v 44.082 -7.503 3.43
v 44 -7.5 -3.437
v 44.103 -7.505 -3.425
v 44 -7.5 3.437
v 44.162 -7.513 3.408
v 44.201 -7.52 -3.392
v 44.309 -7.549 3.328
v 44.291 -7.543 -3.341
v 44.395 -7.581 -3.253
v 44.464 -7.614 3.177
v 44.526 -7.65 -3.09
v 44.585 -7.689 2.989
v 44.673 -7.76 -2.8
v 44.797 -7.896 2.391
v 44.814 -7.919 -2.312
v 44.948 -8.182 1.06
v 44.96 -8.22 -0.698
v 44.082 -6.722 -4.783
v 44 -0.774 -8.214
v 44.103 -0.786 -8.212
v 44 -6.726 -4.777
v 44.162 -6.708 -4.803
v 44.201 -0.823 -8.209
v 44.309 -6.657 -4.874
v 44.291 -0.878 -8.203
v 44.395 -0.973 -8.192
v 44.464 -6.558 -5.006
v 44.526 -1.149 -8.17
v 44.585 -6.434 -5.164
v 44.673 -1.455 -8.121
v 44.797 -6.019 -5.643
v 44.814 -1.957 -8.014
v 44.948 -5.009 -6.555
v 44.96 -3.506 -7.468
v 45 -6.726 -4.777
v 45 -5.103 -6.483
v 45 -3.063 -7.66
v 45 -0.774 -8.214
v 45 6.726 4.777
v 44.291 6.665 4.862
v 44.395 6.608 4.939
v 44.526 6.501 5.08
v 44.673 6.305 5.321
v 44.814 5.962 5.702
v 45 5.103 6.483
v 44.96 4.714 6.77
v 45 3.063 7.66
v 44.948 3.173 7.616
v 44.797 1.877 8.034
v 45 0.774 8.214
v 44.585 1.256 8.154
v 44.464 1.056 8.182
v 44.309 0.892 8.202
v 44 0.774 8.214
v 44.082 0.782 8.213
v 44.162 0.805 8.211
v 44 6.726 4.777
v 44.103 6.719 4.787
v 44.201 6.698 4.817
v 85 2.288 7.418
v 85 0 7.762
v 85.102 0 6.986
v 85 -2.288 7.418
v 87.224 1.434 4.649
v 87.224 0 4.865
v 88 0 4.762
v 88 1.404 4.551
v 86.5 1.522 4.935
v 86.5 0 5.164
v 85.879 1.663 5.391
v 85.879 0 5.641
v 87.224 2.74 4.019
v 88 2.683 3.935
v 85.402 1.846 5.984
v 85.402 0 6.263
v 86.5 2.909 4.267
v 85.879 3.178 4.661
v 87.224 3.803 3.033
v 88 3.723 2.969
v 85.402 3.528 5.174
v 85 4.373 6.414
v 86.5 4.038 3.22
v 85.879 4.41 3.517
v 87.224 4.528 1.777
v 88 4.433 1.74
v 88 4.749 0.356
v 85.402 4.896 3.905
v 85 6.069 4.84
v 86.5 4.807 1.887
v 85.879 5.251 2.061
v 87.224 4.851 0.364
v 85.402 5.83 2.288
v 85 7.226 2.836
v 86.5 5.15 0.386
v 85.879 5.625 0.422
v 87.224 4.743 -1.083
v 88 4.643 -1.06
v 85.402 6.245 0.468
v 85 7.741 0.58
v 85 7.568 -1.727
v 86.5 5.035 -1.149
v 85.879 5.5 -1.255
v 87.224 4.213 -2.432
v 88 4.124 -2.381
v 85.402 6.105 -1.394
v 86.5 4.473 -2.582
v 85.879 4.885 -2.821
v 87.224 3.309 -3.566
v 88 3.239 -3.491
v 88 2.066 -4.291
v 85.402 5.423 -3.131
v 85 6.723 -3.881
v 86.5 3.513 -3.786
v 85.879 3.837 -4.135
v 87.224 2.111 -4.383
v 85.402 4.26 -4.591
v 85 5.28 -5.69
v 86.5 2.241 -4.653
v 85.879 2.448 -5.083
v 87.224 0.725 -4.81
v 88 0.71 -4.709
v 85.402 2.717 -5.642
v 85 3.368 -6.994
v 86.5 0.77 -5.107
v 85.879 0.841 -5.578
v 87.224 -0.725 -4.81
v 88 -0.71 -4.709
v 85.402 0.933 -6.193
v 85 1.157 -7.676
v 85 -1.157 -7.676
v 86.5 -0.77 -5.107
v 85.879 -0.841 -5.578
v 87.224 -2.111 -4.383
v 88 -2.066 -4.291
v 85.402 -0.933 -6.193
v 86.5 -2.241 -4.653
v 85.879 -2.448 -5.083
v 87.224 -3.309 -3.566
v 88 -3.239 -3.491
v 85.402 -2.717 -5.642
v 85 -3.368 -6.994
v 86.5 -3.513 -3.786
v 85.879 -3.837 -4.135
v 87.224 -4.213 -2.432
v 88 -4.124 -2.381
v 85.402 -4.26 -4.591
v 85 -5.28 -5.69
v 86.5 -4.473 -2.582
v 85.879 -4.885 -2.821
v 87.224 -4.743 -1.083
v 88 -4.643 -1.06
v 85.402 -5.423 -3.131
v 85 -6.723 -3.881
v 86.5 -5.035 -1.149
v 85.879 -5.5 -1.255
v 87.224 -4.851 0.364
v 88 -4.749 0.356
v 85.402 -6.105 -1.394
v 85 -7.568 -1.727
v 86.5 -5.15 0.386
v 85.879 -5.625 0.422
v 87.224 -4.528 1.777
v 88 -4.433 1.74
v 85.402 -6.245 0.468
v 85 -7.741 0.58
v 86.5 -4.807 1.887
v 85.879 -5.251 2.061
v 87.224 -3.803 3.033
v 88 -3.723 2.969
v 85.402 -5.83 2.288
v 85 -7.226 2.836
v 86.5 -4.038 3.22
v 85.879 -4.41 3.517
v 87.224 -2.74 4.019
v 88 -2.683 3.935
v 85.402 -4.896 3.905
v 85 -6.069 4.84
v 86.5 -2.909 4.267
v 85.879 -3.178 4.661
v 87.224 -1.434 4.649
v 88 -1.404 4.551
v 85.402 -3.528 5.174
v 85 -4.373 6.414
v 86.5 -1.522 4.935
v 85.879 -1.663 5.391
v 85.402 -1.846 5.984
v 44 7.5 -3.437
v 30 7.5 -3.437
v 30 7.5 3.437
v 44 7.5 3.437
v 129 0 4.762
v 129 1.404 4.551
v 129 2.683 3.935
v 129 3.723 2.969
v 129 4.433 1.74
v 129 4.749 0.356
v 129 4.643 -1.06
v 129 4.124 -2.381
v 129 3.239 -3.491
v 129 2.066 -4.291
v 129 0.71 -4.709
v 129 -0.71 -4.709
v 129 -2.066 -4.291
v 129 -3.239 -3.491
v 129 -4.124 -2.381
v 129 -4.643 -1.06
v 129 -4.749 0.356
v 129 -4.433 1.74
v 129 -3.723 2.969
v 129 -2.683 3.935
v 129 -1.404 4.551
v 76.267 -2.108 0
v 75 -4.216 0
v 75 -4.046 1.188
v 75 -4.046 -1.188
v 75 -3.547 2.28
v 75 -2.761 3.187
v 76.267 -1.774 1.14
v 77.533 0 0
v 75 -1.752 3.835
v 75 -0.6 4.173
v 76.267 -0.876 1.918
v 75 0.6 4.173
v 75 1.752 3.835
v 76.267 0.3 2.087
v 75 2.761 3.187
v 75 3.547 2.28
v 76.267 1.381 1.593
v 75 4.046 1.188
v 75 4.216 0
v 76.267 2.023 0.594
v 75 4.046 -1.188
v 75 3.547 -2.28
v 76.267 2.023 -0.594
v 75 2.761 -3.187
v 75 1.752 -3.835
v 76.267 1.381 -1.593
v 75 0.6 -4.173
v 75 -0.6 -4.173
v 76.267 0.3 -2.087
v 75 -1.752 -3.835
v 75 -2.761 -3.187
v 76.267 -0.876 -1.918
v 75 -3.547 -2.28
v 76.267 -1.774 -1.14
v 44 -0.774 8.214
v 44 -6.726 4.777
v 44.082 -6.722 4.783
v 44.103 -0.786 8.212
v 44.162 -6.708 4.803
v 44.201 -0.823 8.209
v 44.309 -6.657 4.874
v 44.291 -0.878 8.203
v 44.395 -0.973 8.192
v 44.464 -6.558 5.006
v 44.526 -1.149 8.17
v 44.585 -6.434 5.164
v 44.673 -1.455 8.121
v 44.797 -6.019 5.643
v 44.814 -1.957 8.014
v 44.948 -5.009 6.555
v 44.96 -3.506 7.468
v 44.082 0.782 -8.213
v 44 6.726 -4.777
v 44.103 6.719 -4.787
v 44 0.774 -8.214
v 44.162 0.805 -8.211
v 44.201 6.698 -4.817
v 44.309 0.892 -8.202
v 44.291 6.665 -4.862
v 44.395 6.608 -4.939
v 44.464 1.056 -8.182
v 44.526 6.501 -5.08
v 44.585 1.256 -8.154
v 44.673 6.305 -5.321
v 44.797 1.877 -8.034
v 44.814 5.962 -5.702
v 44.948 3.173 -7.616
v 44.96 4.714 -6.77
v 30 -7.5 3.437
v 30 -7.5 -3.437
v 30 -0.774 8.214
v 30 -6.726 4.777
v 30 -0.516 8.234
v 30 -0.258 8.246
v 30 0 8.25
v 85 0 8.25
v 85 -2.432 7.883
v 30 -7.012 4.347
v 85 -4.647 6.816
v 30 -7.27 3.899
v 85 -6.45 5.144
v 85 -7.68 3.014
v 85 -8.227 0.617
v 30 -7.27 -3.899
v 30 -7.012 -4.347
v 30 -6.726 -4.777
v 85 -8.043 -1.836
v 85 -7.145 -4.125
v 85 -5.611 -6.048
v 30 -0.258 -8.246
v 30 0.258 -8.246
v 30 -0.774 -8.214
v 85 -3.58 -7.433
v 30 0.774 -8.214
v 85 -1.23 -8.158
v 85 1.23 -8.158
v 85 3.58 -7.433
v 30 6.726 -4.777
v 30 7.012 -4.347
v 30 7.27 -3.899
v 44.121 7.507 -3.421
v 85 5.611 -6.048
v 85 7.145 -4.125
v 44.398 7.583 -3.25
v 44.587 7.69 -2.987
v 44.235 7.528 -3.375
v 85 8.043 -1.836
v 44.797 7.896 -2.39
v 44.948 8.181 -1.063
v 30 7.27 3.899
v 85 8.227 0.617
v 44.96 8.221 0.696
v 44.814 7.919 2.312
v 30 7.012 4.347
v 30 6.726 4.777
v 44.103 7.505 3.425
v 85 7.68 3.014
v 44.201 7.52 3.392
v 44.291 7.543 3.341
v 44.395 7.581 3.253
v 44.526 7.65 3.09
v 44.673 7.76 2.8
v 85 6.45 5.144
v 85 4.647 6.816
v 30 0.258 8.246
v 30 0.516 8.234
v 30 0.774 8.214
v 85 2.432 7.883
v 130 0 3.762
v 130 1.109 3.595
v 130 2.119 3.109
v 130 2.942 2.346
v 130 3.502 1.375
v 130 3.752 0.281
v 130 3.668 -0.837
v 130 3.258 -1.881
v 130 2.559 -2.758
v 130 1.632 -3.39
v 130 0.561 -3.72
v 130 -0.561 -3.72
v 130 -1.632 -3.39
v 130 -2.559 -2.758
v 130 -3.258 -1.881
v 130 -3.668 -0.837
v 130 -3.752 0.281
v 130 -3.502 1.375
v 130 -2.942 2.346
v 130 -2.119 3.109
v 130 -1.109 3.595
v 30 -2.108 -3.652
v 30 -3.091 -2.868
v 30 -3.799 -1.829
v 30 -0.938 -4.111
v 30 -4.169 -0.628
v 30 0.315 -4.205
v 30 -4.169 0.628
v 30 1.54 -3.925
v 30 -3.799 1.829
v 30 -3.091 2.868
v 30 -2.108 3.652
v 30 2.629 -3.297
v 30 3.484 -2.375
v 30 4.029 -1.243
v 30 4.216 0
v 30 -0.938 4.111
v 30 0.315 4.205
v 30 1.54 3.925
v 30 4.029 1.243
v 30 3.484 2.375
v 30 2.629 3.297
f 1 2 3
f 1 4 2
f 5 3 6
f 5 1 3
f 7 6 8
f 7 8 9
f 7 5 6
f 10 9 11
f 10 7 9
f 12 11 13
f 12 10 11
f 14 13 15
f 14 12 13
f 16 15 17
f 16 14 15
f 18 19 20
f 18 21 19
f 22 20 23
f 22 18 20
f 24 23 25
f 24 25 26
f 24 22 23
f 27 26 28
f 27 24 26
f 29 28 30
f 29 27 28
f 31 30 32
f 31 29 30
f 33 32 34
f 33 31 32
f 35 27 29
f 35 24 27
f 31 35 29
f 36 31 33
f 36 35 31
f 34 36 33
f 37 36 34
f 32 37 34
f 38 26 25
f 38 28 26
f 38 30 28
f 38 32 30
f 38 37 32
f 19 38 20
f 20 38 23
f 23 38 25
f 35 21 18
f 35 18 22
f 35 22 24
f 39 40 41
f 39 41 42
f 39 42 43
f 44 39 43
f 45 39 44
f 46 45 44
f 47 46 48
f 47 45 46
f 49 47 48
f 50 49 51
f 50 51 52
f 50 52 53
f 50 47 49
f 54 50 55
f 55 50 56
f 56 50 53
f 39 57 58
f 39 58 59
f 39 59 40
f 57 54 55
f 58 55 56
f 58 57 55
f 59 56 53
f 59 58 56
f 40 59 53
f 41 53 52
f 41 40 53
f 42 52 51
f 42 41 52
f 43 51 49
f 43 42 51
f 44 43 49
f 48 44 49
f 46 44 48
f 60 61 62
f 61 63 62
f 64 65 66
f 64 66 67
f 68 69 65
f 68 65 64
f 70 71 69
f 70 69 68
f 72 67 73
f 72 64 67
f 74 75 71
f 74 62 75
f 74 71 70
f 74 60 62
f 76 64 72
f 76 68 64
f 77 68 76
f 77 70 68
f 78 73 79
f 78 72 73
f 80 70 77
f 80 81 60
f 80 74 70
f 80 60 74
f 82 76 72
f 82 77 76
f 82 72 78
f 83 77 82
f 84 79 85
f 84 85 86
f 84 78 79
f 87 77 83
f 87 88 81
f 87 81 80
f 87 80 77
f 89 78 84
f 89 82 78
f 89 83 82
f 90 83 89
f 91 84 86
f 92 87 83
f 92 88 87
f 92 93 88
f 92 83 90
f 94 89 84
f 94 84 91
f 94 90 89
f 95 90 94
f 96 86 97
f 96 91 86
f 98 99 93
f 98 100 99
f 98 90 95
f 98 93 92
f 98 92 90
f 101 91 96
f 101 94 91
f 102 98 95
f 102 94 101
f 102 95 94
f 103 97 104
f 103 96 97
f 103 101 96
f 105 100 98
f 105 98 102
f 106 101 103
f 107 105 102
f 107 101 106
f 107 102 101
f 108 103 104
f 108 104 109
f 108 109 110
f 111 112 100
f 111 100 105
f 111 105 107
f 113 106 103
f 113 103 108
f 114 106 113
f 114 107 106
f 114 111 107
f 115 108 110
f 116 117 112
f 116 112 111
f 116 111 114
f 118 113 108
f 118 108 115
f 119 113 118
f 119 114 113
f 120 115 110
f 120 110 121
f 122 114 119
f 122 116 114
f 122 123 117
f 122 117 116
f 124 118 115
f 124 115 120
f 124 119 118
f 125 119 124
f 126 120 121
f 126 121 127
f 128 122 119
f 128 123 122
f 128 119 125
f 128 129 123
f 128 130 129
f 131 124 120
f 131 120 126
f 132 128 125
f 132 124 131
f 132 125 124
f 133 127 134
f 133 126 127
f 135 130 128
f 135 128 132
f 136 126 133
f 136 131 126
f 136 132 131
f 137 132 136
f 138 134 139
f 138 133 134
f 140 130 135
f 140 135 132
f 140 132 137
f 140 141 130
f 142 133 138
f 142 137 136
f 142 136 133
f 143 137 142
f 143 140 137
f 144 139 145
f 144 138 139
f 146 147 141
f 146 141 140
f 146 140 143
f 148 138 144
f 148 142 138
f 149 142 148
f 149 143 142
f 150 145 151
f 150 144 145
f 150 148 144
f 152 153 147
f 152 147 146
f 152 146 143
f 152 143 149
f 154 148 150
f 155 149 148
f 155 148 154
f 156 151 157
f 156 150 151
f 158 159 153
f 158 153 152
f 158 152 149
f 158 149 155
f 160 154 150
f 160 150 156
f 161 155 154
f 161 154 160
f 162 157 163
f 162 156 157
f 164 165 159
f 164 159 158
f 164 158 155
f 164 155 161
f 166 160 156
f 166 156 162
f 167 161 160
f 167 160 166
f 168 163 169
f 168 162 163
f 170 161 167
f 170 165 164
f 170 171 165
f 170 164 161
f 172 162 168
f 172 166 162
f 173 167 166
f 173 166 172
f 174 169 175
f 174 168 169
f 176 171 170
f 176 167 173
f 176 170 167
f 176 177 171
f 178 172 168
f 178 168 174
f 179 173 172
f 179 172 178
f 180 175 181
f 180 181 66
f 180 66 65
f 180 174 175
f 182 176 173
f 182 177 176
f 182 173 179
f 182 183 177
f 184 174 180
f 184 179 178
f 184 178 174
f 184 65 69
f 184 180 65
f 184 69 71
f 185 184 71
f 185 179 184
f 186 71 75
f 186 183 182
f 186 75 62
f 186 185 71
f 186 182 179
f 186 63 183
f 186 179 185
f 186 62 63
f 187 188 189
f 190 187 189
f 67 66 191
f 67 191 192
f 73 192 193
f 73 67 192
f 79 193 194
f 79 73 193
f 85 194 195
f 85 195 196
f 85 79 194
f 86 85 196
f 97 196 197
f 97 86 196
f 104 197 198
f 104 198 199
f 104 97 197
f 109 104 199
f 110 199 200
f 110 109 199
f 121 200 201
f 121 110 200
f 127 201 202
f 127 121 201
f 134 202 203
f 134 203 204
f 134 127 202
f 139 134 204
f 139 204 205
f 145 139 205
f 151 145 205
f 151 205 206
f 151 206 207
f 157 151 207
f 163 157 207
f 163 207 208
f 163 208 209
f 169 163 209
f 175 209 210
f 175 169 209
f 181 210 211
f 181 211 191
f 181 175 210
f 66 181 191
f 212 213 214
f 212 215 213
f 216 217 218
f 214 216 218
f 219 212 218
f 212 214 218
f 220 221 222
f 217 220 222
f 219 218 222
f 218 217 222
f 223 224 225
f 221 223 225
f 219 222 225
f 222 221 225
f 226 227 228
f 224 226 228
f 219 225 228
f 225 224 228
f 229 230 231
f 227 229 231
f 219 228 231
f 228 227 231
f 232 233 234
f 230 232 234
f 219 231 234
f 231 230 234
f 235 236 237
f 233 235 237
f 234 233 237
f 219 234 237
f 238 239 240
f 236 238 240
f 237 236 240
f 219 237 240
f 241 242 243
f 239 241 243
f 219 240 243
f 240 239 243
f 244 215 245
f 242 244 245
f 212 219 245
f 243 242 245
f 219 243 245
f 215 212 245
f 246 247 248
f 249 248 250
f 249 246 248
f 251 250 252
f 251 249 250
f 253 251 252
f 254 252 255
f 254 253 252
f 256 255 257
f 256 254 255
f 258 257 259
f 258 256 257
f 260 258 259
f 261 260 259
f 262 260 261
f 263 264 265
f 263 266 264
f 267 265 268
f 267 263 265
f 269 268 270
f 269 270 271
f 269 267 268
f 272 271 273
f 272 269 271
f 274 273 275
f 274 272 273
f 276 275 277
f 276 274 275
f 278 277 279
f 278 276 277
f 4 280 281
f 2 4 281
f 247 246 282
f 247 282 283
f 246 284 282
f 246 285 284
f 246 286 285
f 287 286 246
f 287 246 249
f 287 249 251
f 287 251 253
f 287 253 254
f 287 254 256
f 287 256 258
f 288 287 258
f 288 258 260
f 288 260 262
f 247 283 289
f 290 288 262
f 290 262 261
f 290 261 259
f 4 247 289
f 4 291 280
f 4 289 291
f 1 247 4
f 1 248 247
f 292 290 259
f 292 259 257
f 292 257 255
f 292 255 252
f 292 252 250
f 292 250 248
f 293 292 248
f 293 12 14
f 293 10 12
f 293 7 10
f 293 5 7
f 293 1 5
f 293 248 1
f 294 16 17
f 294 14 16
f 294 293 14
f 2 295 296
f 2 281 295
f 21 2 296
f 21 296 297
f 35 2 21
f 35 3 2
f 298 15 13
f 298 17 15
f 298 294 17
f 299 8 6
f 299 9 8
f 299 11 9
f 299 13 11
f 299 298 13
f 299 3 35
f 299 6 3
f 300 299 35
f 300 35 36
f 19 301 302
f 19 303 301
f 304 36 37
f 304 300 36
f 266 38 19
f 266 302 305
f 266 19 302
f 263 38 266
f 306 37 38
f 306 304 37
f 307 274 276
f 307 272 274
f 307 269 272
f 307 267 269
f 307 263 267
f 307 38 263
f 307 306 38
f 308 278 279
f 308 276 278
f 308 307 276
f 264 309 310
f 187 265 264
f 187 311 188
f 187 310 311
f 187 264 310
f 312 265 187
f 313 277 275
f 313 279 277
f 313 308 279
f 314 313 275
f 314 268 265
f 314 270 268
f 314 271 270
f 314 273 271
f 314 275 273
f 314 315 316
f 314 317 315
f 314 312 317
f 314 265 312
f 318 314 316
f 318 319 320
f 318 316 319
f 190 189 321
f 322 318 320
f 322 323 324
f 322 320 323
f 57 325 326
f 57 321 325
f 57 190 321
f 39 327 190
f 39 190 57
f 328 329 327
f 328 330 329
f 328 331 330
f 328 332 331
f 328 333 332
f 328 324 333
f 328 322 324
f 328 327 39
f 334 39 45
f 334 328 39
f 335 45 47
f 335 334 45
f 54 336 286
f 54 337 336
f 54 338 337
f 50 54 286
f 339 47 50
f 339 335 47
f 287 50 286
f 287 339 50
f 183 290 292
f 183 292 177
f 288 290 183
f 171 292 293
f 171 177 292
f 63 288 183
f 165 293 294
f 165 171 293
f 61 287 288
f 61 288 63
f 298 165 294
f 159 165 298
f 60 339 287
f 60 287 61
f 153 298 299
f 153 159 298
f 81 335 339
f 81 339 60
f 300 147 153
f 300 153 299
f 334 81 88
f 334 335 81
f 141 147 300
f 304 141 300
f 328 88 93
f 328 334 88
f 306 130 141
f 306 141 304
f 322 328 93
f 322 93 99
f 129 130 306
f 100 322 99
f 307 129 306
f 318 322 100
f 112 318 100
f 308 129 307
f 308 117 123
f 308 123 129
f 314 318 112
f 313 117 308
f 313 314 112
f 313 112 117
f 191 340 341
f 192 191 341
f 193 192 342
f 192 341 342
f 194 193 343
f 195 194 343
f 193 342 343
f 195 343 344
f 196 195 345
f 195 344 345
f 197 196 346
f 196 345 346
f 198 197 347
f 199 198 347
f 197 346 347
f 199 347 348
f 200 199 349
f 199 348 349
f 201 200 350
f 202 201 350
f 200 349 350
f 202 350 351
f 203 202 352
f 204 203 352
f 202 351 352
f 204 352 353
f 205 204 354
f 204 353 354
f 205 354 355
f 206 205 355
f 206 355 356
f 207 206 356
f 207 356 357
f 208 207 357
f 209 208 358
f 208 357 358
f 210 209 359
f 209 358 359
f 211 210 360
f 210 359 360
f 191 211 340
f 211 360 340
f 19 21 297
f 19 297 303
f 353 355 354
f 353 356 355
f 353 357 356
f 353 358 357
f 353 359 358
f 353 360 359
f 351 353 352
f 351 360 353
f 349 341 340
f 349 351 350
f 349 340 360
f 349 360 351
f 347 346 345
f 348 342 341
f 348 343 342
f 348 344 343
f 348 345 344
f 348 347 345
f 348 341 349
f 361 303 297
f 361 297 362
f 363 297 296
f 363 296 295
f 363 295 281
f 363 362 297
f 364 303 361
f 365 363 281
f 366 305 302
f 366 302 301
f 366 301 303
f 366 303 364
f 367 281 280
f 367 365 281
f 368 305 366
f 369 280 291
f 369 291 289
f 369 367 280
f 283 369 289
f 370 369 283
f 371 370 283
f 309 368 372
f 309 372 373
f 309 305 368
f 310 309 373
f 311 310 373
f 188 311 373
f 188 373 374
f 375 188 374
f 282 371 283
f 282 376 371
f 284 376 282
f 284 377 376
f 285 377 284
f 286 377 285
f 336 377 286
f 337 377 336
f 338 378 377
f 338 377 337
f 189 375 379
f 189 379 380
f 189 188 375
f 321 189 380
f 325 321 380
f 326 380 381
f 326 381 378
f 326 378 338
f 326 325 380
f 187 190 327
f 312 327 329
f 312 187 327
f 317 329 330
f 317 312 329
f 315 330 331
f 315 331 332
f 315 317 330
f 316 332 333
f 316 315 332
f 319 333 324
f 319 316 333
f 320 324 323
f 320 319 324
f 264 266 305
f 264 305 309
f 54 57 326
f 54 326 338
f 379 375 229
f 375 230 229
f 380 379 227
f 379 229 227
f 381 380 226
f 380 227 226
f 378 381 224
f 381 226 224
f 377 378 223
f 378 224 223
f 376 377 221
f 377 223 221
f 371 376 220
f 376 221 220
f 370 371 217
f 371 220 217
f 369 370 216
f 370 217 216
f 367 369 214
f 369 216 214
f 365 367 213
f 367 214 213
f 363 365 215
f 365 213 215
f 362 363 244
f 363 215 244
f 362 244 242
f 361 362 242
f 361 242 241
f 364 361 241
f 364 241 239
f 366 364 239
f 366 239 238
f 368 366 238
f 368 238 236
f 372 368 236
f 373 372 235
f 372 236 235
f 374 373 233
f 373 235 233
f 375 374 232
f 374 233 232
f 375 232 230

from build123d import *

# Parameters (mm, degrees)
F3_D         = 8.4328
F3_DEPTH     = 45
F3_TIP       = 2.5334687141
F2_R         = 25
F4_DEPTH     = 15
F5_T4_DEPTH  = 11.8738635424
F5_S5_R      = 8.25
F5_T6_DEPTH  = 8
F5_T10_DEPTH = 11.8738635424
F5_S11_R     = 8.25
F5_T12_DEPTH = 7
F5_T16_DEPTH = 11.8738635424
F5_S17_R     = 8.25
F5_T18_DEPTH = 8
F5_T22_DEPTH = 11.8738635424
F5_S23_R     = 8.25
F5_T24_DEPTH = 7
F5_T28_DEPTH = 11.8738635424
F5_S29_R     = 8.25
F5_T30_DEPTH = 8
F5_T34_DEPTH = 11.8738635424
F5_S35_R     = 8.25
F5_T36_DEPTH = 8
F6_SIZE      = 1
F7_R         = 3


# Not quite as in the source:
# - a fillet or chamfer that OpenCascade refuses, or shapes differently, is made with other operations: its cross-section is extruded or revolved along the edge and cut away or added


with BuildPart() as f1:
    # F0 (on Front) → F1 (revolve)
    with BuildSketch(Plane.XZ):
        Polygon((30, 8.25), (30, 0), (130, 0), (130, 4.7625), (85, 4.7625), (85, 8.25), align=None)
    revolve(axis=Axis((80, 0, 0), (-1, 0, 0)))

    # F3
    with Locations(Plane(origin=(30, 0, 0), x_dir=(0, -1, 0), z_dir=(-1, 0, 0))):
        with Locations((0, 0)):
            Hole(F3_D / 2, depth=F3_DEPTH)
            with Locations((0, 0, -(F3_DEPTH + F3_TIP / 2))):  # 118° drill point
                Cone(0, F3_D / 2, F3_TIP, mode=Mode.SUBTRACT)

    # F2 (on face) → F4 (cut)
    with BuildSketch(Plane(origin=(30, 0, 0), x_dir=(0, -1, 0), z_dir=(-1, 0, 0))):
        Circle(F2_R)
        with BuildLine():
            Line((6.7264702249, 4.7767246428), (7.5, 4.3301270189))
            Line((7.5, 4.3301270189), (7.5, 3.4369317712))
            ThreePointArc((7.5, 3.4369317712), (8.0603194726, 1.7589059099), (8.25, 0))
            ThreePointArc((8.25, 0), (8.0603194726, -1.7589059099), (7.5, -3.4369317712))
            Line((7.5, -3.4369317712), (7.5, -4.3301270189))
            Line((7.5, -4.3301270189), (6.7264702249, -4.7767246428))
            ThreePointArc((6.7264702249, -4.7767246428), (4.125, -7.1447095812), (0.7735297751, -8.213656414))
            Line((0.7735297751, -8.213656414), (0, -8.6602540378))
            Line((0, -8.6602540378), (-0.7735297751, -8.213656414))
            ThreePointArc((-0.7735297751, -8.213656414), (-4.125, -7.1447095812), (-6.7264702249, -4.7767246428))
            Line((-6.7264702249, -4.7767246428), (-7.5, -4.3301270189))
            Line((-7.5, -4.3301270189), (-7.5, -3.4369317712))
            ThreePointArc((-7.5, -3.4369317712), (-8.25, 0), (-7.5, 3.4369317712))
            Line((-7.5, 3.4369317712), (-7.5, 4.3301270189))
            Line((-7.5, 4.3301270189), (-6.7264702249, 4.7767246428))
            ThreePointArc((-6.7264702249, 4.7767246428), (-4.125, 7.1447095812), (-0.7735297751, 8.213656414))
            Line((-0.7735297751, 8.213656414), (0, 8.6602540378))
            Line((0, 8.6602540378), (0.7735297751, 8.213656414))
            ThreePointArc((0.7735297751, 8.213656414), (4.125, 7.1447095812), (6.7264702249, 4.7767246428))
        make_face(mode=Mode.SUBTRACT)
        with BuildLine():
            ThreePointArc((8.25, 0), (8.0603194726, 1.7589059099), (7.5, 3.4369317712))
            Line((7.5, 3.4369317712), (7.5, -3.4369317712))
            ThreePointArc((7.5, -3.4369317712), (8.0603194726, -1.7589059099), (8.25, 0))
        make_face()
        with BuildLine():
            Line((0.7735297751, 8.213656414), (6.7264702249, 4.7767246428))
            ThreePointArc((6.7264702249, 4.7767246428), (4.125, 7.1447095812), (0.7735297751, 8.213656414))
        make_face()
        with BuildLine():
            ThreePointArc((0.7735297751, -8.213656414), (4.125, -7.1447095812), (6.7264702249, -4.7767246428))
            Line((6.7264702249, -4.7767246428), (0.7735297751, -8.213656414))
        make_face()
        with BuildLine():
            Line((-6.7264702249, 4.7767246428), (-0.7735297751, 8.213656414))
            ThreePointArc((-0.7735297751, 8.213656414), (-4.125, 7.1447095812), (-6.7264702249, 4.7767246428))
        make_face()
        with BuildLine():
            ThreePointArc((-6.7264702249, -4.7767246428), (-4.125, -7.1447095812), (-0.7735297751, -8.213656414))
            Line((-0.7735297751, -8.213656414), (-6.7264702249, -4.7767246428))
        make_face()
        with BuildLine():
            Line((-7.5, -3.4369317712), (-7.5, 3.4369317712))
            ThreePointArc((-7.5, 3.4369317712), (-8.25, 0), (-7.5, -3.4369317712))
        make_face()
    extrude(amount=-F4_DEPTH, mode=Mode.SUBTRACT)

    # F5: fillet of radius 1 on 6 edges, made by hand


with BuildPart() as f5_tool2:
    # F5_s3 → F5_t4 (new body)
    with BuildSketch(Plane(origin=(0, 5.1415337344, 2.9684658856), x_dir=(1, 0, 0), z_dir=(0, -0.8660254038, -0.5))):
        with BuildLine():
            ThreePointArc((44, 7.5), (44.7071067812, 7.7928932188), (45, 8.5))
            Line((45, 8.5), (45, 7.5))
            Line((45, 7.5), (44, 7.5))
        make_face()
    extrude(amount=F5_T4_DEPTH)

    # F5_s5 → F5_t6 (intersect, symmetric)
    with BuildSketch(Plane.YZ.offset(44.5)):
        Circle(F5_S5_R)
    extrude(amount=F5_T6_DEPTH, both=True, mode=Mode.INTERSECT)


with BuildPart() as f1_1:
    add(f1.part)

    # F5_t1: union F5_tool2
    add(f5_tool2.part)


with BuildPart() as f5_tool8:
    # F5_s9 → F5_t10 (new body)
    with BuildSketch(Plane.XY.offset(5.9369317712)):
        with BuildLine():
            ThreePointArc((44, -7.5), (44.7071067812, -7.7928932188), (45, -8.5))
            Line((45, -8.5), (45, -7.5))
            Line((45, -7.5), (44, -7.5))
        make_face()
    extrude(amount=-F5_T10_DEPTH)

    # F5_s11 → F5_t12 (intersect, symmetric)
    with BuildSketch(Plane.YZ.offset(44.5)):
        Circle(F5_S11_R)
    extrude(amount=F5_T12_DEPTH, both=True, mode=Mode.INTERSECT)


with BuildPart() as f1_2:
    add(f1_1.part)

    # F5_t7: union F5_tool8
    add(f5_tool8.part)


with BuildPart() as f5_tool14:
    # F5_s15 → F5_t16 (new body)
    with BuildSketch(Plane(origin=(0, 5.1415337344, -2.9684658856), x_dir=(1, 0, 0), z_dir=(0, -0.8660254038, 0.5))):
        with BuildLine():
            ThreePointArc((44, 7.5), (44.7071067812, 7.7928932188), (45, 8.5))
            Line((45, 8.5), (45, 7.5))
            Line((45, 7.5), (44, 7.5))
        make_face()
    extrude(amount=F5_T16_DEPTH)

    # F5_s17 → F5_t18 (intersect, symmetric)
    with BuildSketch(Plane.YZ.offset(44.5)):
        Circle(F5_S17_R)
    extrude(amount=F5_T18_DEPTH, both=True, mode=Mode.INTERSECT)


with BuildPart() as f1_3:
    add(f1_2.part)

    # F5_t13: union F5_tool14
    add(f5_tool14.part)


with BuildPart() as f5_tool20:
    # F5_s21 → F5_t22 (new body)
    with BuildSketch(Plane.XY.offset(-5.9369317712)):
        with BuildLine():
            ThreePointArc((44, 7.5), (44.7071067812, 7.7928932188), (45, 8.5))
            Line((45, 8.5), (45, 7.5))
            Line((45, 7.5), (44, 7.5))
        make_face()
    extrude(amount=F5_T22_DEPTH)

    # F5_s23 → F5_t24 (intersect, symmetric)
    with BuildSketch(Plane.YZ.offset(44.5)):
        Circle(F5_S23_R)
    extrude(amount=F5_T24_DEPTH, both=True, mode=Mode.INTERSECT)


with BuildPart() as f1_4:
    add(f1_3.part)

    # F5_t19: union F5_tool20
    add(f5_tool20.part)


with BuildPart() as f5_tool26:
    # F5_s27 → F5_t28 (new body)
    with BuildSketch(Plane(origin=(0, -5.1415337344, -2.9684658856), x_dir=(1, 0, 0), z_dir=(0, 0.8660254038, 0.5))):
        with BuildLine():
            ThreePointArc((44, 7.5), (44.7071067812, 7.7928932188), (45, 8.5))
            Line((45, 8.5), (45, 7.5))
            Line((45, 7.5), (44, 7.5))
        make_face()
    extrude(amount=F5_T28_DEPTH)

    # F5_s29 → F5_t30 (intersect, symmetric)
    with BuildSketch(Plane.YZ.offset(44.5)):
        Circle(F5_S29_R)
    extrude(amount=F5_T30_DEPTH, both=True, mode=Mode.INTERSECT)


with BuildPart() as f1_5:
    add(f1_4.part)

    # F5_t25: union F5_tool26
    add(f5_tool26.part)


with BuildPart() as f5_tool32:
    # F5_s33 → F5_t34 (new body)
    with BuildSketch(Plane(origin=(0, -5.1415337344, 2.9684658856), x_dir=(1, 0, 0), z_dir=(0, 0.8660254038, -0.5))):
        with BuildLine():
            ThreePointArc((44, 7.5), (44.7071067812, 7.7928932188), (45, 8.5))
            Line((45, 8.5), (45, 7.5))
            Line((45, 7.5), (44, 7.5))
        make_face()
    extrude(amount=F5_T34_DEPTH)

    # F5_s35 → F5_t36 (intersect, symmetric)
    with BuildSketch(Plane.YZ.offset(44.5)):
        Circle(F5_S35_R)
    extrude(amount=F5_T36_DEPTH, both=True, mode=Mode.INTERSECT)


with BuildPart() as f1_6:
    add(f1_5.part)

    # F5_t31: union F5_tool32
    add(f5_tool32.part)

    # F6
    f6_edges = [f1_6.edges().sort_by_distance(p)[0] for p in [
        (130, 0, -4.7625),
    ]]
    chamfer(f6_edges, length=F6_SIZE)

    # F7
    f7_edges = [f1_6.edges().sort_by_distance(p)[0] for p in [
        (85, 0, -4.7625),
    ]]
    fillet(f7_edges, radius=F7_R)


solid = f1_6.part
